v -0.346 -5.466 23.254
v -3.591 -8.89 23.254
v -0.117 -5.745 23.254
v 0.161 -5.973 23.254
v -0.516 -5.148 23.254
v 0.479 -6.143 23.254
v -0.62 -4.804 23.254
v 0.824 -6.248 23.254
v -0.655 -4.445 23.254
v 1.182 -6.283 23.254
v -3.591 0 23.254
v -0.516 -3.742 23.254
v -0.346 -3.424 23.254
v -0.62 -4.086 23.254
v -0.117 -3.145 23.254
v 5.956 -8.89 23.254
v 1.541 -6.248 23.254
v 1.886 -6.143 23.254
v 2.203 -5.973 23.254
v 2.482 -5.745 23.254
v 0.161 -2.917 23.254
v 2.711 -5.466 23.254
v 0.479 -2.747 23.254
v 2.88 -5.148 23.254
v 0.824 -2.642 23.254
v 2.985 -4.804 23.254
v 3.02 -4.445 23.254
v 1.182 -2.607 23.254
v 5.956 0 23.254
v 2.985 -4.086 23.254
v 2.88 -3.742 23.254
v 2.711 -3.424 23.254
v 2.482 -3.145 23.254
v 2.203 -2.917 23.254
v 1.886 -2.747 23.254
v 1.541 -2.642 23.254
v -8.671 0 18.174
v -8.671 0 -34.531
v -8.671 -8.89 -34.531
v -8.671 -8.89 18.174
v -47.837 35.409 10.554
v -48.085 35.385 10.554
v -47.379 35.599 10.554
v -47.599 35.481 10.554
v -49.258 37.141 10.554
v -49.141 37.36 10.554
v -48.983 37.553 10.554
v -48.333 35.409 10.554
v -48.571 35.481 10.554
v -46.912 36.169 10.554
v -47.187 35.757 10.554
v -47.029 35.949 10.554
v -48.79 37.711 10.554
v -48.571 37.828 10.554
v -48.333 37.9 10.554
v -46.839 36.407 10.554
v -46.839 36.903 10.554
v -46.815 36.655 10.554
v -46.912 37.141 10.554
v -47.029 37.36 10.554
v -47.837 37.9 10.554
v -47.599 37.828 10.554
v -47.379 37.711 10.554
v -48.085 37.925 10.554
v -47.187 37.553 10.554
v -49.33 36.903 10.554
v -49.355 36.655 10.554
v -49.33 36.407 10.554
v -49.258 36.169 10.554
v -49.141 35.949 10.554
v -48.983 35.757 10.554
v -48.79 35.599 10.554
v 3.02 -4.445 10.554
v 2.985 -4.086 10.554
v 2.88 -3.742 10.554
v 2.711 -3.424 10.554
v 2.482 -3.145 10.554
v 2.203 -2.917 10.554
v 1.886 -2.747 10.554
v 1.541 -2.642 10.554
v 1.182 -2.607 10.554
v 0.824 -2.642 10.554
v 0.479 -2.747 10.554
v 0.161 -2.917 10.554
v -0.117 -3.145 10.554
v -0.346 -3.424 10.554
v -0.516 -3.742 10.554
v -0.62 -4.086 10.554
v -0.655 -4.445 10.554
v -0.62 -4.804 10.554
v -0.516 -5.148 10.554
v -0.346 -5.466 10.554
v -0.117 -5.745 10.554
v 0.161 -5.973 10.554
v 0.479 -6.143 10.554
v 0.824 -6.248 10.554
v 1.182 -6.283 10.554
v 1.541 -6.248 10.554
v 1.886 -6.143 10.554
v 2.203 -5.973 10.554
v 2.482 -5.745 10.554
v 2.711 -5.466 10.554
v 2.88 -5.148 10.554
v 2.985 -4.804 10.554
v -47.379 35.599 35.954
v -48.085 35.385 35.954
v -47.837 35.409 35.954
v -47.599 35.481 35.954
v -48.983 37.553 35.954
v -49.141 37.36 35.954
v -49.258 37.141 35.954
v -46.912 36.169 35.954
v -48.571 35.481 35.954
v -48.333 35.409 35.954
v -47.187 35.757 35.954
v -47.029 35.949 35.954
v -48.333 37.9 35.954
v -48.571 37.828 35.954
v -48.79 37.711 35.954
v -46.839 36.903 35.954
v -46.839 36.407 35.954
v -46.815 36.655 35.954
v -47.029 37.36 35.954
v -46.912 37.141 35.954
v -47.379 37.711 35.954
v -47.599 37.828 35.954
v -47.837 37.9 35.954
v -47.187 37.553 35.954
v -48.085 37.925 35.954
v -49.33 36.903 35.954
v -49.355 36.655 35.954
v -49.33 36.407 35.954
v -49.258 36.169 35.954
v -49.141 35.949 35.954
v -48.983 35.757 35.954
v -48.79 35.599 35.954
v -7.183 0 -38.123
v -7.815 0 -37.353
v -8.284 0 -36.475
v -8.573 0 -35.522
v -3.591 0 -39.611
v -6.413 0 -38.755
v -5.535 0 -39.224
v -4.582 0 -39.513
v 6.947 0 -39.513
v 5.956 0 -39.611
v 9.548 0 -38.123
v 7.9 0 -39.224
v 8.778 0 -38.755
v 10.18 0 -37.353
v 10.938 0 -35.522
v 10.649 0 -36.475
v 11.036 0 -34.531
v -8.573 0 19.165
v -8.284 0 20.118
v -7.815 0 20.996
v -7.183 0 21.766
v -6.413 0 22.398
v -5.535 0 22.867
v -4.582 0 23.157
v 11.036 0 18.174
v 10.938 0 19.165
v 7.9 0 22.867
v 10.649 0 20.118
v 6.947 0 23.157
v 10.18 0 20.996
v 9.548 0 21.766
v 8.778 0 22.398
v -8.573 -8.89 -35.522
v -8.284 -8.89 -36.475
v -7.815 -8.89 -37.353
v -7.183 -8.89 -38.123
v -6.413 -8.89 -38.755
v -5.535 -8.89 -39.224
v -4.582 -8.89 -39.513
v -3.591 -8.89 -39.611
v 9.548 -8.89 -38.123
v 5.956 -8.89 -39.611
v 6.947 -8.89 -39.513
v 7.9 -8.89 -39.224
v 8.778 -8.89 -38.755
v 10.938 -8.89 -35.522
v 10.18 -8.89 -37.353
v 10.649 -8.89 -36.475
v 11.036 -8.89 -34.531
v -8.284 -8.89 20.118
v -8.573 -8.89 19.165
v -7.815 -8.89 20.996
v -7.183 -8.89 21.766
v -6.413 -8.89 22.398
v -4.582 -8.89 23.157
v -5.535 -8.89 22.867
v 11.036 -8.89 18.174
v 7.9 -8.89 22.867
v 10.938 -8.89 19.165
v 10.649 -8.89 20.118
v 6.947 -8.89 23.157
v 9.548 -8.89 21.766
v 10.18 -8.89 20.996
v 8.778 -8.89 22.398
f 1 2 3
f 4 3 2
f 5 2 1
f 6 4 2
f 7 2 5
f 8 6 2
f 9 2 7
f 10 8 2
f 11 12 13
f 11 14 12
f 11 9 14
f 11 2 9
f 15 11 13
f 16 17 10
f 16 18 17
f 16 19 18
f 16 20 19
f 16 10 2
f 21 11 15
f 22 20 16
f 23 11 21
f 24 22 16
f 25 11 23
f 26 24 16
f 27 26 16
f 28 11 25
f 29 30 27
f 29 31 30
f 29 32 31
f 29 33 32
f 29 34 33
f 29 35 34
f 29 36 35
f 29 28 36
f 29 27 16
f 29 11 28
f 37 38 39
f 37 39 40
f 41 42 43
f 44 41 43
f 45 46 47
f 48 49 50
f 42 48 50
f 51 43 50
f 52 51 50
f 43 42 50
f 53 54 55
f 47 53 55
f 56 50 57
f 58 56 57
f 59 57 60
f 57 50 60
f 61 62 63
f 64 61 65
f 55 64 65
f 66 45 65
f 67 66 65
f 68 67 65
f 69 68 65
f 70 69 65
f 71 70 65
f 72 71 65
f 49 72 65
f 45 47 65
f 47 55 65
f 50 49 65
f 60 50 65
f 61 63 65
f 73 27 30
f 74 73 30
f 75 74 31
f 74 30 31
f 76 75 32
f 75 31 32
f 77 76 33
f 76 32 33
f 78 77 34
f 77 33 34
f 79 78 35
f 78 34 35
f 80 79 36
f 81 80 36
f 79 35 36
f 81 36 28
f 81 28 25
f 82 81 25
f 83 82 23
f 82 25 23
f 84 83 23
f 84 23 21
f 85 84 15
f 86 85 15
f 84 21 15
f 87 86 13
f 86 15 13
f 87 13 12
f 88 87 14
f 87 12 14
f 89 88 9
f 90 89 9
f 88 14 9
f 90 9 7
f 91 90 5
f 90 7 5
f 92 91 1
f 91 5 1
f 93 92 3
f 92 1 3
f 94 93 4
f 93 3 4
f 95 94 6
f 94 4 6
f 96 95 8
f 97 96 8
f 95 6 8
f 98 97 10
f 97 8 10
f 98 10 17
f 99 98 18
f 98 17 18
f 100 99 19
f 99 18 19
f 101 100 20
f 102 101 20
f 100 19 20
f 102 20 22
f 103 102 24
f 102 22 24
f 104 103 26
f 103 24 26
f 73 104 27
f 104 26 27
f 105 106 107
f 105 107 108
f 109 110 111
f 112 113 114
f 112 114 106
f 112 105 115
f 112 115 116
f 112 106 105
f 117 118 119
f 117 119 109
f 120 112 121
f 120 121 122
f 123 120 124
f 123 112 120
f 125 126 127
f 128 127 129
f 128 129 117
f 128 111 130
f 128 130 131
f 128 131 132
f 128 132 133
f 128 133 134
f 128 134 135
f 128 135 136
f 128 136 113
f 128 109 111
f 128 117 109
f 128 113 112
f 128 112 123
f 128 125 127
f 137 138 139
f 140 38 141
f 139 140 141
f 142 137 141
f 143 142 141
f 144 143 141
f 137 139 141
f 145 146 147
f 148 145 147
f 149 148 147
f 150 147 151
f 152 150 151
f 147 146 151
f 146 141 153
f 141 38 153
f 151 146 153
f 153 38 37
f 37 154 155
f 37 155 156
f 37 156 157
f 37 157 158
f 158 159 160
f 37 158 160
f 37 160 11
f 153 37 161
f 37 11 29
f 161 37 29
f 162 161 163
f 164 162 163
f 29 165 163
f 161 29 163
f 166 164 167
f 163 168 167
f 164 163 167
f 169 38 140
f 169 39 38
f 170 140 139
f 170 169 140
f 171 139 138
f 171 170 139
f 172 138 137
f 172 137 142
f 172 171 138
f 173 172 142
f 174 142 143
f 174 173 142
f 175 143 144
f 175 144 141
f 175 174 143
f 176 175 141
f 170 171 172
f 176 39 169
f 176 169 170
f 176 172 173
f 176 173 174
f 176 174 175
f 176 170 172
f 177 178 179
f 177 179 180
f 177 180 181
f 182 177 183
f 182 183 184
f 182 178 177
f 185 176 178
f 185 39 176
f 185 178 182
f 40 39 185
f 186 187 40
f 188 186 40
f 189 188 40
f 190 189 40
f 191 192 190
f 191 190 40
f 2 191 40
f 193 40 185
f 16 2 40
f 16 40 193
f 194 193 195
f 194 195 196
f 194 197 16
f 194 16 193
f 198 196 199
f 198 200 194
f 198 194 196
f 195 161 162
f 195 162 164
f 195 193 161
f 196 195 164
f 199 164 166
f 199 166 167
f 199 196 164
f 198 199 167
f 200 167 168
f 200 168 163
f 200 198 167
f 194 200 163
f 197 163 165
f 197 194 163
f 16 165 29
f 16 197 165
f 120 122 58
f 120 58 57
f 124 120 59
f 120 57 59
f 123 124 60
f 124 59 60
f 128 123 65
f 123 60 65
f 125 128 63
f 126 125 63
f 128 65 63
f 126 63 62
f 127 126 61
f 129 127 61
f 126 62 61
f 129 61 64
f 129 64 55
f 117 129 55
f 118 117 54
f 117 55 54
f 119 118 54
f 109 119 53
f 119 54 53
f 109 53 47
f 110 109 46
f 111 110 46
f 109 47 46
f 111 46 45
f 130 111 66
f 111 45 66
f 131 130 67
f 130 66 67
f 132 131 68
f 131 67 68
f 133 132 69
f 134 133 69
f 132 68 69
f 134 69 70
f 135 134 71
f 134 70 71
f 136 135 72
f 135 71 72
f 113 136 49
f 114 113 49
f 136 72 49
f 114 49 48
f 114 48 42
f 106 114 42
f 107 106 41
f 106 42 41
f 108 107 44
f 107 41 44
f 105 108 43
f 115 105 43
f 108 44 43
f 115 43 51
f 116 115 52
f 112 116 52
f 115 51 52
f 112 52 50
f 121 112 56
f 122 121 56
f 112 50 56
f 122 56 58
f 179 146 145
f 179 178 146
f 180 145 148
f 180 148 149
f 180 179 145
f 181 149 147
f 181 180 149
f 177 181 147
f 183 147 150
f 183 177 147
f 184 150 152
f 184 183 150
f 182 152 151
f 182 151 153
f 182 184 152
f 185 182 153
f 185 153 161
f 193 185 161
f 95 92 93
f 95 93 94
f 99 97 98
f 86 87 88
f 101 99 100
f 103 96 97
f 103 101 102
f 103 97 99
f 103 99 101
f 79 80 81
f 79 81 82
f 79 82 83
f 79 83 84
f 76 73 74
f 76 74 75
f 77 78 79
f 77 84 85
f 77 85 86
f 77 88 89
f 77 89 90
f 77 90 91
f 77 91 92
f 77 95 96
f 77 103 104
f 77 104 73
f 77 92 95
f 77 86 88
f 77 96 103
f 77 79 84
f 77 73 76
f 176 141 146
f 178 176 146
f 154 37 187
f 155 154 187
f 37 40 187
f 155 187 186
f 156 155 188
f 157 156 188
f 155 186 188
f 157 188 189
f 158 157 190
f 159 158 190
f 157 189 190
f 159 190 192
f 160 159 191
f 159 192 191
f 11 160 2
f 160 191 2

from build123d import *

# Parameters (mm, degrees)
F0_W     = 19.706898
F0_H     = 62.865
F1_DEPTH = 8.89
F2_R     = 5.08
F3_R     = 1.837876
F4_DEPTH = 12.7
F5_R     = 1.27
F6_DEPTH = 25.4


with BuildPart() as f1:
    # F0 (on Front) → F1 (new body)
    with BuildSketch(Plane.XZ):
        with Locations((1.182414, -8.178363)):
            Rectangle(F0_W, F0_H)
    extrude(amount=F1_DEPTH)

    # F2
    f2_edges = [f1.edges().sort_by_distance(p)[0] for p in [
        (-8.671035, -4.445, -39.610863),
        (11.035863, -4.445, -39.610863),
        (11.035863, -4.445, 23.254137),
        (-8.671035, -4.445, 23.254137),
    ]]
    fillet(f2_edges, radius=F2_R)

    # F3 (on face) → F4 (cut)
    with BuildSketch(Plane.XY.offset(23.254137)):
        with Locations((1.182414, -4.445)):
            Circle(F3_R)
    extrude(amount=-F4_DEPTH, mode=Mode.SUBTRACT)


with BuildPart() as f6:
    # F5 (on face) → F6 (new body)
    with BuildSketch(Plane.XY.offset(10.554137)):
        with Locations((-48.084829, 36.654826)):
            Circle(F5_R)
    extrude(amount=F6_DEPTH)


solid = Compound([f1.part, f6.part])
